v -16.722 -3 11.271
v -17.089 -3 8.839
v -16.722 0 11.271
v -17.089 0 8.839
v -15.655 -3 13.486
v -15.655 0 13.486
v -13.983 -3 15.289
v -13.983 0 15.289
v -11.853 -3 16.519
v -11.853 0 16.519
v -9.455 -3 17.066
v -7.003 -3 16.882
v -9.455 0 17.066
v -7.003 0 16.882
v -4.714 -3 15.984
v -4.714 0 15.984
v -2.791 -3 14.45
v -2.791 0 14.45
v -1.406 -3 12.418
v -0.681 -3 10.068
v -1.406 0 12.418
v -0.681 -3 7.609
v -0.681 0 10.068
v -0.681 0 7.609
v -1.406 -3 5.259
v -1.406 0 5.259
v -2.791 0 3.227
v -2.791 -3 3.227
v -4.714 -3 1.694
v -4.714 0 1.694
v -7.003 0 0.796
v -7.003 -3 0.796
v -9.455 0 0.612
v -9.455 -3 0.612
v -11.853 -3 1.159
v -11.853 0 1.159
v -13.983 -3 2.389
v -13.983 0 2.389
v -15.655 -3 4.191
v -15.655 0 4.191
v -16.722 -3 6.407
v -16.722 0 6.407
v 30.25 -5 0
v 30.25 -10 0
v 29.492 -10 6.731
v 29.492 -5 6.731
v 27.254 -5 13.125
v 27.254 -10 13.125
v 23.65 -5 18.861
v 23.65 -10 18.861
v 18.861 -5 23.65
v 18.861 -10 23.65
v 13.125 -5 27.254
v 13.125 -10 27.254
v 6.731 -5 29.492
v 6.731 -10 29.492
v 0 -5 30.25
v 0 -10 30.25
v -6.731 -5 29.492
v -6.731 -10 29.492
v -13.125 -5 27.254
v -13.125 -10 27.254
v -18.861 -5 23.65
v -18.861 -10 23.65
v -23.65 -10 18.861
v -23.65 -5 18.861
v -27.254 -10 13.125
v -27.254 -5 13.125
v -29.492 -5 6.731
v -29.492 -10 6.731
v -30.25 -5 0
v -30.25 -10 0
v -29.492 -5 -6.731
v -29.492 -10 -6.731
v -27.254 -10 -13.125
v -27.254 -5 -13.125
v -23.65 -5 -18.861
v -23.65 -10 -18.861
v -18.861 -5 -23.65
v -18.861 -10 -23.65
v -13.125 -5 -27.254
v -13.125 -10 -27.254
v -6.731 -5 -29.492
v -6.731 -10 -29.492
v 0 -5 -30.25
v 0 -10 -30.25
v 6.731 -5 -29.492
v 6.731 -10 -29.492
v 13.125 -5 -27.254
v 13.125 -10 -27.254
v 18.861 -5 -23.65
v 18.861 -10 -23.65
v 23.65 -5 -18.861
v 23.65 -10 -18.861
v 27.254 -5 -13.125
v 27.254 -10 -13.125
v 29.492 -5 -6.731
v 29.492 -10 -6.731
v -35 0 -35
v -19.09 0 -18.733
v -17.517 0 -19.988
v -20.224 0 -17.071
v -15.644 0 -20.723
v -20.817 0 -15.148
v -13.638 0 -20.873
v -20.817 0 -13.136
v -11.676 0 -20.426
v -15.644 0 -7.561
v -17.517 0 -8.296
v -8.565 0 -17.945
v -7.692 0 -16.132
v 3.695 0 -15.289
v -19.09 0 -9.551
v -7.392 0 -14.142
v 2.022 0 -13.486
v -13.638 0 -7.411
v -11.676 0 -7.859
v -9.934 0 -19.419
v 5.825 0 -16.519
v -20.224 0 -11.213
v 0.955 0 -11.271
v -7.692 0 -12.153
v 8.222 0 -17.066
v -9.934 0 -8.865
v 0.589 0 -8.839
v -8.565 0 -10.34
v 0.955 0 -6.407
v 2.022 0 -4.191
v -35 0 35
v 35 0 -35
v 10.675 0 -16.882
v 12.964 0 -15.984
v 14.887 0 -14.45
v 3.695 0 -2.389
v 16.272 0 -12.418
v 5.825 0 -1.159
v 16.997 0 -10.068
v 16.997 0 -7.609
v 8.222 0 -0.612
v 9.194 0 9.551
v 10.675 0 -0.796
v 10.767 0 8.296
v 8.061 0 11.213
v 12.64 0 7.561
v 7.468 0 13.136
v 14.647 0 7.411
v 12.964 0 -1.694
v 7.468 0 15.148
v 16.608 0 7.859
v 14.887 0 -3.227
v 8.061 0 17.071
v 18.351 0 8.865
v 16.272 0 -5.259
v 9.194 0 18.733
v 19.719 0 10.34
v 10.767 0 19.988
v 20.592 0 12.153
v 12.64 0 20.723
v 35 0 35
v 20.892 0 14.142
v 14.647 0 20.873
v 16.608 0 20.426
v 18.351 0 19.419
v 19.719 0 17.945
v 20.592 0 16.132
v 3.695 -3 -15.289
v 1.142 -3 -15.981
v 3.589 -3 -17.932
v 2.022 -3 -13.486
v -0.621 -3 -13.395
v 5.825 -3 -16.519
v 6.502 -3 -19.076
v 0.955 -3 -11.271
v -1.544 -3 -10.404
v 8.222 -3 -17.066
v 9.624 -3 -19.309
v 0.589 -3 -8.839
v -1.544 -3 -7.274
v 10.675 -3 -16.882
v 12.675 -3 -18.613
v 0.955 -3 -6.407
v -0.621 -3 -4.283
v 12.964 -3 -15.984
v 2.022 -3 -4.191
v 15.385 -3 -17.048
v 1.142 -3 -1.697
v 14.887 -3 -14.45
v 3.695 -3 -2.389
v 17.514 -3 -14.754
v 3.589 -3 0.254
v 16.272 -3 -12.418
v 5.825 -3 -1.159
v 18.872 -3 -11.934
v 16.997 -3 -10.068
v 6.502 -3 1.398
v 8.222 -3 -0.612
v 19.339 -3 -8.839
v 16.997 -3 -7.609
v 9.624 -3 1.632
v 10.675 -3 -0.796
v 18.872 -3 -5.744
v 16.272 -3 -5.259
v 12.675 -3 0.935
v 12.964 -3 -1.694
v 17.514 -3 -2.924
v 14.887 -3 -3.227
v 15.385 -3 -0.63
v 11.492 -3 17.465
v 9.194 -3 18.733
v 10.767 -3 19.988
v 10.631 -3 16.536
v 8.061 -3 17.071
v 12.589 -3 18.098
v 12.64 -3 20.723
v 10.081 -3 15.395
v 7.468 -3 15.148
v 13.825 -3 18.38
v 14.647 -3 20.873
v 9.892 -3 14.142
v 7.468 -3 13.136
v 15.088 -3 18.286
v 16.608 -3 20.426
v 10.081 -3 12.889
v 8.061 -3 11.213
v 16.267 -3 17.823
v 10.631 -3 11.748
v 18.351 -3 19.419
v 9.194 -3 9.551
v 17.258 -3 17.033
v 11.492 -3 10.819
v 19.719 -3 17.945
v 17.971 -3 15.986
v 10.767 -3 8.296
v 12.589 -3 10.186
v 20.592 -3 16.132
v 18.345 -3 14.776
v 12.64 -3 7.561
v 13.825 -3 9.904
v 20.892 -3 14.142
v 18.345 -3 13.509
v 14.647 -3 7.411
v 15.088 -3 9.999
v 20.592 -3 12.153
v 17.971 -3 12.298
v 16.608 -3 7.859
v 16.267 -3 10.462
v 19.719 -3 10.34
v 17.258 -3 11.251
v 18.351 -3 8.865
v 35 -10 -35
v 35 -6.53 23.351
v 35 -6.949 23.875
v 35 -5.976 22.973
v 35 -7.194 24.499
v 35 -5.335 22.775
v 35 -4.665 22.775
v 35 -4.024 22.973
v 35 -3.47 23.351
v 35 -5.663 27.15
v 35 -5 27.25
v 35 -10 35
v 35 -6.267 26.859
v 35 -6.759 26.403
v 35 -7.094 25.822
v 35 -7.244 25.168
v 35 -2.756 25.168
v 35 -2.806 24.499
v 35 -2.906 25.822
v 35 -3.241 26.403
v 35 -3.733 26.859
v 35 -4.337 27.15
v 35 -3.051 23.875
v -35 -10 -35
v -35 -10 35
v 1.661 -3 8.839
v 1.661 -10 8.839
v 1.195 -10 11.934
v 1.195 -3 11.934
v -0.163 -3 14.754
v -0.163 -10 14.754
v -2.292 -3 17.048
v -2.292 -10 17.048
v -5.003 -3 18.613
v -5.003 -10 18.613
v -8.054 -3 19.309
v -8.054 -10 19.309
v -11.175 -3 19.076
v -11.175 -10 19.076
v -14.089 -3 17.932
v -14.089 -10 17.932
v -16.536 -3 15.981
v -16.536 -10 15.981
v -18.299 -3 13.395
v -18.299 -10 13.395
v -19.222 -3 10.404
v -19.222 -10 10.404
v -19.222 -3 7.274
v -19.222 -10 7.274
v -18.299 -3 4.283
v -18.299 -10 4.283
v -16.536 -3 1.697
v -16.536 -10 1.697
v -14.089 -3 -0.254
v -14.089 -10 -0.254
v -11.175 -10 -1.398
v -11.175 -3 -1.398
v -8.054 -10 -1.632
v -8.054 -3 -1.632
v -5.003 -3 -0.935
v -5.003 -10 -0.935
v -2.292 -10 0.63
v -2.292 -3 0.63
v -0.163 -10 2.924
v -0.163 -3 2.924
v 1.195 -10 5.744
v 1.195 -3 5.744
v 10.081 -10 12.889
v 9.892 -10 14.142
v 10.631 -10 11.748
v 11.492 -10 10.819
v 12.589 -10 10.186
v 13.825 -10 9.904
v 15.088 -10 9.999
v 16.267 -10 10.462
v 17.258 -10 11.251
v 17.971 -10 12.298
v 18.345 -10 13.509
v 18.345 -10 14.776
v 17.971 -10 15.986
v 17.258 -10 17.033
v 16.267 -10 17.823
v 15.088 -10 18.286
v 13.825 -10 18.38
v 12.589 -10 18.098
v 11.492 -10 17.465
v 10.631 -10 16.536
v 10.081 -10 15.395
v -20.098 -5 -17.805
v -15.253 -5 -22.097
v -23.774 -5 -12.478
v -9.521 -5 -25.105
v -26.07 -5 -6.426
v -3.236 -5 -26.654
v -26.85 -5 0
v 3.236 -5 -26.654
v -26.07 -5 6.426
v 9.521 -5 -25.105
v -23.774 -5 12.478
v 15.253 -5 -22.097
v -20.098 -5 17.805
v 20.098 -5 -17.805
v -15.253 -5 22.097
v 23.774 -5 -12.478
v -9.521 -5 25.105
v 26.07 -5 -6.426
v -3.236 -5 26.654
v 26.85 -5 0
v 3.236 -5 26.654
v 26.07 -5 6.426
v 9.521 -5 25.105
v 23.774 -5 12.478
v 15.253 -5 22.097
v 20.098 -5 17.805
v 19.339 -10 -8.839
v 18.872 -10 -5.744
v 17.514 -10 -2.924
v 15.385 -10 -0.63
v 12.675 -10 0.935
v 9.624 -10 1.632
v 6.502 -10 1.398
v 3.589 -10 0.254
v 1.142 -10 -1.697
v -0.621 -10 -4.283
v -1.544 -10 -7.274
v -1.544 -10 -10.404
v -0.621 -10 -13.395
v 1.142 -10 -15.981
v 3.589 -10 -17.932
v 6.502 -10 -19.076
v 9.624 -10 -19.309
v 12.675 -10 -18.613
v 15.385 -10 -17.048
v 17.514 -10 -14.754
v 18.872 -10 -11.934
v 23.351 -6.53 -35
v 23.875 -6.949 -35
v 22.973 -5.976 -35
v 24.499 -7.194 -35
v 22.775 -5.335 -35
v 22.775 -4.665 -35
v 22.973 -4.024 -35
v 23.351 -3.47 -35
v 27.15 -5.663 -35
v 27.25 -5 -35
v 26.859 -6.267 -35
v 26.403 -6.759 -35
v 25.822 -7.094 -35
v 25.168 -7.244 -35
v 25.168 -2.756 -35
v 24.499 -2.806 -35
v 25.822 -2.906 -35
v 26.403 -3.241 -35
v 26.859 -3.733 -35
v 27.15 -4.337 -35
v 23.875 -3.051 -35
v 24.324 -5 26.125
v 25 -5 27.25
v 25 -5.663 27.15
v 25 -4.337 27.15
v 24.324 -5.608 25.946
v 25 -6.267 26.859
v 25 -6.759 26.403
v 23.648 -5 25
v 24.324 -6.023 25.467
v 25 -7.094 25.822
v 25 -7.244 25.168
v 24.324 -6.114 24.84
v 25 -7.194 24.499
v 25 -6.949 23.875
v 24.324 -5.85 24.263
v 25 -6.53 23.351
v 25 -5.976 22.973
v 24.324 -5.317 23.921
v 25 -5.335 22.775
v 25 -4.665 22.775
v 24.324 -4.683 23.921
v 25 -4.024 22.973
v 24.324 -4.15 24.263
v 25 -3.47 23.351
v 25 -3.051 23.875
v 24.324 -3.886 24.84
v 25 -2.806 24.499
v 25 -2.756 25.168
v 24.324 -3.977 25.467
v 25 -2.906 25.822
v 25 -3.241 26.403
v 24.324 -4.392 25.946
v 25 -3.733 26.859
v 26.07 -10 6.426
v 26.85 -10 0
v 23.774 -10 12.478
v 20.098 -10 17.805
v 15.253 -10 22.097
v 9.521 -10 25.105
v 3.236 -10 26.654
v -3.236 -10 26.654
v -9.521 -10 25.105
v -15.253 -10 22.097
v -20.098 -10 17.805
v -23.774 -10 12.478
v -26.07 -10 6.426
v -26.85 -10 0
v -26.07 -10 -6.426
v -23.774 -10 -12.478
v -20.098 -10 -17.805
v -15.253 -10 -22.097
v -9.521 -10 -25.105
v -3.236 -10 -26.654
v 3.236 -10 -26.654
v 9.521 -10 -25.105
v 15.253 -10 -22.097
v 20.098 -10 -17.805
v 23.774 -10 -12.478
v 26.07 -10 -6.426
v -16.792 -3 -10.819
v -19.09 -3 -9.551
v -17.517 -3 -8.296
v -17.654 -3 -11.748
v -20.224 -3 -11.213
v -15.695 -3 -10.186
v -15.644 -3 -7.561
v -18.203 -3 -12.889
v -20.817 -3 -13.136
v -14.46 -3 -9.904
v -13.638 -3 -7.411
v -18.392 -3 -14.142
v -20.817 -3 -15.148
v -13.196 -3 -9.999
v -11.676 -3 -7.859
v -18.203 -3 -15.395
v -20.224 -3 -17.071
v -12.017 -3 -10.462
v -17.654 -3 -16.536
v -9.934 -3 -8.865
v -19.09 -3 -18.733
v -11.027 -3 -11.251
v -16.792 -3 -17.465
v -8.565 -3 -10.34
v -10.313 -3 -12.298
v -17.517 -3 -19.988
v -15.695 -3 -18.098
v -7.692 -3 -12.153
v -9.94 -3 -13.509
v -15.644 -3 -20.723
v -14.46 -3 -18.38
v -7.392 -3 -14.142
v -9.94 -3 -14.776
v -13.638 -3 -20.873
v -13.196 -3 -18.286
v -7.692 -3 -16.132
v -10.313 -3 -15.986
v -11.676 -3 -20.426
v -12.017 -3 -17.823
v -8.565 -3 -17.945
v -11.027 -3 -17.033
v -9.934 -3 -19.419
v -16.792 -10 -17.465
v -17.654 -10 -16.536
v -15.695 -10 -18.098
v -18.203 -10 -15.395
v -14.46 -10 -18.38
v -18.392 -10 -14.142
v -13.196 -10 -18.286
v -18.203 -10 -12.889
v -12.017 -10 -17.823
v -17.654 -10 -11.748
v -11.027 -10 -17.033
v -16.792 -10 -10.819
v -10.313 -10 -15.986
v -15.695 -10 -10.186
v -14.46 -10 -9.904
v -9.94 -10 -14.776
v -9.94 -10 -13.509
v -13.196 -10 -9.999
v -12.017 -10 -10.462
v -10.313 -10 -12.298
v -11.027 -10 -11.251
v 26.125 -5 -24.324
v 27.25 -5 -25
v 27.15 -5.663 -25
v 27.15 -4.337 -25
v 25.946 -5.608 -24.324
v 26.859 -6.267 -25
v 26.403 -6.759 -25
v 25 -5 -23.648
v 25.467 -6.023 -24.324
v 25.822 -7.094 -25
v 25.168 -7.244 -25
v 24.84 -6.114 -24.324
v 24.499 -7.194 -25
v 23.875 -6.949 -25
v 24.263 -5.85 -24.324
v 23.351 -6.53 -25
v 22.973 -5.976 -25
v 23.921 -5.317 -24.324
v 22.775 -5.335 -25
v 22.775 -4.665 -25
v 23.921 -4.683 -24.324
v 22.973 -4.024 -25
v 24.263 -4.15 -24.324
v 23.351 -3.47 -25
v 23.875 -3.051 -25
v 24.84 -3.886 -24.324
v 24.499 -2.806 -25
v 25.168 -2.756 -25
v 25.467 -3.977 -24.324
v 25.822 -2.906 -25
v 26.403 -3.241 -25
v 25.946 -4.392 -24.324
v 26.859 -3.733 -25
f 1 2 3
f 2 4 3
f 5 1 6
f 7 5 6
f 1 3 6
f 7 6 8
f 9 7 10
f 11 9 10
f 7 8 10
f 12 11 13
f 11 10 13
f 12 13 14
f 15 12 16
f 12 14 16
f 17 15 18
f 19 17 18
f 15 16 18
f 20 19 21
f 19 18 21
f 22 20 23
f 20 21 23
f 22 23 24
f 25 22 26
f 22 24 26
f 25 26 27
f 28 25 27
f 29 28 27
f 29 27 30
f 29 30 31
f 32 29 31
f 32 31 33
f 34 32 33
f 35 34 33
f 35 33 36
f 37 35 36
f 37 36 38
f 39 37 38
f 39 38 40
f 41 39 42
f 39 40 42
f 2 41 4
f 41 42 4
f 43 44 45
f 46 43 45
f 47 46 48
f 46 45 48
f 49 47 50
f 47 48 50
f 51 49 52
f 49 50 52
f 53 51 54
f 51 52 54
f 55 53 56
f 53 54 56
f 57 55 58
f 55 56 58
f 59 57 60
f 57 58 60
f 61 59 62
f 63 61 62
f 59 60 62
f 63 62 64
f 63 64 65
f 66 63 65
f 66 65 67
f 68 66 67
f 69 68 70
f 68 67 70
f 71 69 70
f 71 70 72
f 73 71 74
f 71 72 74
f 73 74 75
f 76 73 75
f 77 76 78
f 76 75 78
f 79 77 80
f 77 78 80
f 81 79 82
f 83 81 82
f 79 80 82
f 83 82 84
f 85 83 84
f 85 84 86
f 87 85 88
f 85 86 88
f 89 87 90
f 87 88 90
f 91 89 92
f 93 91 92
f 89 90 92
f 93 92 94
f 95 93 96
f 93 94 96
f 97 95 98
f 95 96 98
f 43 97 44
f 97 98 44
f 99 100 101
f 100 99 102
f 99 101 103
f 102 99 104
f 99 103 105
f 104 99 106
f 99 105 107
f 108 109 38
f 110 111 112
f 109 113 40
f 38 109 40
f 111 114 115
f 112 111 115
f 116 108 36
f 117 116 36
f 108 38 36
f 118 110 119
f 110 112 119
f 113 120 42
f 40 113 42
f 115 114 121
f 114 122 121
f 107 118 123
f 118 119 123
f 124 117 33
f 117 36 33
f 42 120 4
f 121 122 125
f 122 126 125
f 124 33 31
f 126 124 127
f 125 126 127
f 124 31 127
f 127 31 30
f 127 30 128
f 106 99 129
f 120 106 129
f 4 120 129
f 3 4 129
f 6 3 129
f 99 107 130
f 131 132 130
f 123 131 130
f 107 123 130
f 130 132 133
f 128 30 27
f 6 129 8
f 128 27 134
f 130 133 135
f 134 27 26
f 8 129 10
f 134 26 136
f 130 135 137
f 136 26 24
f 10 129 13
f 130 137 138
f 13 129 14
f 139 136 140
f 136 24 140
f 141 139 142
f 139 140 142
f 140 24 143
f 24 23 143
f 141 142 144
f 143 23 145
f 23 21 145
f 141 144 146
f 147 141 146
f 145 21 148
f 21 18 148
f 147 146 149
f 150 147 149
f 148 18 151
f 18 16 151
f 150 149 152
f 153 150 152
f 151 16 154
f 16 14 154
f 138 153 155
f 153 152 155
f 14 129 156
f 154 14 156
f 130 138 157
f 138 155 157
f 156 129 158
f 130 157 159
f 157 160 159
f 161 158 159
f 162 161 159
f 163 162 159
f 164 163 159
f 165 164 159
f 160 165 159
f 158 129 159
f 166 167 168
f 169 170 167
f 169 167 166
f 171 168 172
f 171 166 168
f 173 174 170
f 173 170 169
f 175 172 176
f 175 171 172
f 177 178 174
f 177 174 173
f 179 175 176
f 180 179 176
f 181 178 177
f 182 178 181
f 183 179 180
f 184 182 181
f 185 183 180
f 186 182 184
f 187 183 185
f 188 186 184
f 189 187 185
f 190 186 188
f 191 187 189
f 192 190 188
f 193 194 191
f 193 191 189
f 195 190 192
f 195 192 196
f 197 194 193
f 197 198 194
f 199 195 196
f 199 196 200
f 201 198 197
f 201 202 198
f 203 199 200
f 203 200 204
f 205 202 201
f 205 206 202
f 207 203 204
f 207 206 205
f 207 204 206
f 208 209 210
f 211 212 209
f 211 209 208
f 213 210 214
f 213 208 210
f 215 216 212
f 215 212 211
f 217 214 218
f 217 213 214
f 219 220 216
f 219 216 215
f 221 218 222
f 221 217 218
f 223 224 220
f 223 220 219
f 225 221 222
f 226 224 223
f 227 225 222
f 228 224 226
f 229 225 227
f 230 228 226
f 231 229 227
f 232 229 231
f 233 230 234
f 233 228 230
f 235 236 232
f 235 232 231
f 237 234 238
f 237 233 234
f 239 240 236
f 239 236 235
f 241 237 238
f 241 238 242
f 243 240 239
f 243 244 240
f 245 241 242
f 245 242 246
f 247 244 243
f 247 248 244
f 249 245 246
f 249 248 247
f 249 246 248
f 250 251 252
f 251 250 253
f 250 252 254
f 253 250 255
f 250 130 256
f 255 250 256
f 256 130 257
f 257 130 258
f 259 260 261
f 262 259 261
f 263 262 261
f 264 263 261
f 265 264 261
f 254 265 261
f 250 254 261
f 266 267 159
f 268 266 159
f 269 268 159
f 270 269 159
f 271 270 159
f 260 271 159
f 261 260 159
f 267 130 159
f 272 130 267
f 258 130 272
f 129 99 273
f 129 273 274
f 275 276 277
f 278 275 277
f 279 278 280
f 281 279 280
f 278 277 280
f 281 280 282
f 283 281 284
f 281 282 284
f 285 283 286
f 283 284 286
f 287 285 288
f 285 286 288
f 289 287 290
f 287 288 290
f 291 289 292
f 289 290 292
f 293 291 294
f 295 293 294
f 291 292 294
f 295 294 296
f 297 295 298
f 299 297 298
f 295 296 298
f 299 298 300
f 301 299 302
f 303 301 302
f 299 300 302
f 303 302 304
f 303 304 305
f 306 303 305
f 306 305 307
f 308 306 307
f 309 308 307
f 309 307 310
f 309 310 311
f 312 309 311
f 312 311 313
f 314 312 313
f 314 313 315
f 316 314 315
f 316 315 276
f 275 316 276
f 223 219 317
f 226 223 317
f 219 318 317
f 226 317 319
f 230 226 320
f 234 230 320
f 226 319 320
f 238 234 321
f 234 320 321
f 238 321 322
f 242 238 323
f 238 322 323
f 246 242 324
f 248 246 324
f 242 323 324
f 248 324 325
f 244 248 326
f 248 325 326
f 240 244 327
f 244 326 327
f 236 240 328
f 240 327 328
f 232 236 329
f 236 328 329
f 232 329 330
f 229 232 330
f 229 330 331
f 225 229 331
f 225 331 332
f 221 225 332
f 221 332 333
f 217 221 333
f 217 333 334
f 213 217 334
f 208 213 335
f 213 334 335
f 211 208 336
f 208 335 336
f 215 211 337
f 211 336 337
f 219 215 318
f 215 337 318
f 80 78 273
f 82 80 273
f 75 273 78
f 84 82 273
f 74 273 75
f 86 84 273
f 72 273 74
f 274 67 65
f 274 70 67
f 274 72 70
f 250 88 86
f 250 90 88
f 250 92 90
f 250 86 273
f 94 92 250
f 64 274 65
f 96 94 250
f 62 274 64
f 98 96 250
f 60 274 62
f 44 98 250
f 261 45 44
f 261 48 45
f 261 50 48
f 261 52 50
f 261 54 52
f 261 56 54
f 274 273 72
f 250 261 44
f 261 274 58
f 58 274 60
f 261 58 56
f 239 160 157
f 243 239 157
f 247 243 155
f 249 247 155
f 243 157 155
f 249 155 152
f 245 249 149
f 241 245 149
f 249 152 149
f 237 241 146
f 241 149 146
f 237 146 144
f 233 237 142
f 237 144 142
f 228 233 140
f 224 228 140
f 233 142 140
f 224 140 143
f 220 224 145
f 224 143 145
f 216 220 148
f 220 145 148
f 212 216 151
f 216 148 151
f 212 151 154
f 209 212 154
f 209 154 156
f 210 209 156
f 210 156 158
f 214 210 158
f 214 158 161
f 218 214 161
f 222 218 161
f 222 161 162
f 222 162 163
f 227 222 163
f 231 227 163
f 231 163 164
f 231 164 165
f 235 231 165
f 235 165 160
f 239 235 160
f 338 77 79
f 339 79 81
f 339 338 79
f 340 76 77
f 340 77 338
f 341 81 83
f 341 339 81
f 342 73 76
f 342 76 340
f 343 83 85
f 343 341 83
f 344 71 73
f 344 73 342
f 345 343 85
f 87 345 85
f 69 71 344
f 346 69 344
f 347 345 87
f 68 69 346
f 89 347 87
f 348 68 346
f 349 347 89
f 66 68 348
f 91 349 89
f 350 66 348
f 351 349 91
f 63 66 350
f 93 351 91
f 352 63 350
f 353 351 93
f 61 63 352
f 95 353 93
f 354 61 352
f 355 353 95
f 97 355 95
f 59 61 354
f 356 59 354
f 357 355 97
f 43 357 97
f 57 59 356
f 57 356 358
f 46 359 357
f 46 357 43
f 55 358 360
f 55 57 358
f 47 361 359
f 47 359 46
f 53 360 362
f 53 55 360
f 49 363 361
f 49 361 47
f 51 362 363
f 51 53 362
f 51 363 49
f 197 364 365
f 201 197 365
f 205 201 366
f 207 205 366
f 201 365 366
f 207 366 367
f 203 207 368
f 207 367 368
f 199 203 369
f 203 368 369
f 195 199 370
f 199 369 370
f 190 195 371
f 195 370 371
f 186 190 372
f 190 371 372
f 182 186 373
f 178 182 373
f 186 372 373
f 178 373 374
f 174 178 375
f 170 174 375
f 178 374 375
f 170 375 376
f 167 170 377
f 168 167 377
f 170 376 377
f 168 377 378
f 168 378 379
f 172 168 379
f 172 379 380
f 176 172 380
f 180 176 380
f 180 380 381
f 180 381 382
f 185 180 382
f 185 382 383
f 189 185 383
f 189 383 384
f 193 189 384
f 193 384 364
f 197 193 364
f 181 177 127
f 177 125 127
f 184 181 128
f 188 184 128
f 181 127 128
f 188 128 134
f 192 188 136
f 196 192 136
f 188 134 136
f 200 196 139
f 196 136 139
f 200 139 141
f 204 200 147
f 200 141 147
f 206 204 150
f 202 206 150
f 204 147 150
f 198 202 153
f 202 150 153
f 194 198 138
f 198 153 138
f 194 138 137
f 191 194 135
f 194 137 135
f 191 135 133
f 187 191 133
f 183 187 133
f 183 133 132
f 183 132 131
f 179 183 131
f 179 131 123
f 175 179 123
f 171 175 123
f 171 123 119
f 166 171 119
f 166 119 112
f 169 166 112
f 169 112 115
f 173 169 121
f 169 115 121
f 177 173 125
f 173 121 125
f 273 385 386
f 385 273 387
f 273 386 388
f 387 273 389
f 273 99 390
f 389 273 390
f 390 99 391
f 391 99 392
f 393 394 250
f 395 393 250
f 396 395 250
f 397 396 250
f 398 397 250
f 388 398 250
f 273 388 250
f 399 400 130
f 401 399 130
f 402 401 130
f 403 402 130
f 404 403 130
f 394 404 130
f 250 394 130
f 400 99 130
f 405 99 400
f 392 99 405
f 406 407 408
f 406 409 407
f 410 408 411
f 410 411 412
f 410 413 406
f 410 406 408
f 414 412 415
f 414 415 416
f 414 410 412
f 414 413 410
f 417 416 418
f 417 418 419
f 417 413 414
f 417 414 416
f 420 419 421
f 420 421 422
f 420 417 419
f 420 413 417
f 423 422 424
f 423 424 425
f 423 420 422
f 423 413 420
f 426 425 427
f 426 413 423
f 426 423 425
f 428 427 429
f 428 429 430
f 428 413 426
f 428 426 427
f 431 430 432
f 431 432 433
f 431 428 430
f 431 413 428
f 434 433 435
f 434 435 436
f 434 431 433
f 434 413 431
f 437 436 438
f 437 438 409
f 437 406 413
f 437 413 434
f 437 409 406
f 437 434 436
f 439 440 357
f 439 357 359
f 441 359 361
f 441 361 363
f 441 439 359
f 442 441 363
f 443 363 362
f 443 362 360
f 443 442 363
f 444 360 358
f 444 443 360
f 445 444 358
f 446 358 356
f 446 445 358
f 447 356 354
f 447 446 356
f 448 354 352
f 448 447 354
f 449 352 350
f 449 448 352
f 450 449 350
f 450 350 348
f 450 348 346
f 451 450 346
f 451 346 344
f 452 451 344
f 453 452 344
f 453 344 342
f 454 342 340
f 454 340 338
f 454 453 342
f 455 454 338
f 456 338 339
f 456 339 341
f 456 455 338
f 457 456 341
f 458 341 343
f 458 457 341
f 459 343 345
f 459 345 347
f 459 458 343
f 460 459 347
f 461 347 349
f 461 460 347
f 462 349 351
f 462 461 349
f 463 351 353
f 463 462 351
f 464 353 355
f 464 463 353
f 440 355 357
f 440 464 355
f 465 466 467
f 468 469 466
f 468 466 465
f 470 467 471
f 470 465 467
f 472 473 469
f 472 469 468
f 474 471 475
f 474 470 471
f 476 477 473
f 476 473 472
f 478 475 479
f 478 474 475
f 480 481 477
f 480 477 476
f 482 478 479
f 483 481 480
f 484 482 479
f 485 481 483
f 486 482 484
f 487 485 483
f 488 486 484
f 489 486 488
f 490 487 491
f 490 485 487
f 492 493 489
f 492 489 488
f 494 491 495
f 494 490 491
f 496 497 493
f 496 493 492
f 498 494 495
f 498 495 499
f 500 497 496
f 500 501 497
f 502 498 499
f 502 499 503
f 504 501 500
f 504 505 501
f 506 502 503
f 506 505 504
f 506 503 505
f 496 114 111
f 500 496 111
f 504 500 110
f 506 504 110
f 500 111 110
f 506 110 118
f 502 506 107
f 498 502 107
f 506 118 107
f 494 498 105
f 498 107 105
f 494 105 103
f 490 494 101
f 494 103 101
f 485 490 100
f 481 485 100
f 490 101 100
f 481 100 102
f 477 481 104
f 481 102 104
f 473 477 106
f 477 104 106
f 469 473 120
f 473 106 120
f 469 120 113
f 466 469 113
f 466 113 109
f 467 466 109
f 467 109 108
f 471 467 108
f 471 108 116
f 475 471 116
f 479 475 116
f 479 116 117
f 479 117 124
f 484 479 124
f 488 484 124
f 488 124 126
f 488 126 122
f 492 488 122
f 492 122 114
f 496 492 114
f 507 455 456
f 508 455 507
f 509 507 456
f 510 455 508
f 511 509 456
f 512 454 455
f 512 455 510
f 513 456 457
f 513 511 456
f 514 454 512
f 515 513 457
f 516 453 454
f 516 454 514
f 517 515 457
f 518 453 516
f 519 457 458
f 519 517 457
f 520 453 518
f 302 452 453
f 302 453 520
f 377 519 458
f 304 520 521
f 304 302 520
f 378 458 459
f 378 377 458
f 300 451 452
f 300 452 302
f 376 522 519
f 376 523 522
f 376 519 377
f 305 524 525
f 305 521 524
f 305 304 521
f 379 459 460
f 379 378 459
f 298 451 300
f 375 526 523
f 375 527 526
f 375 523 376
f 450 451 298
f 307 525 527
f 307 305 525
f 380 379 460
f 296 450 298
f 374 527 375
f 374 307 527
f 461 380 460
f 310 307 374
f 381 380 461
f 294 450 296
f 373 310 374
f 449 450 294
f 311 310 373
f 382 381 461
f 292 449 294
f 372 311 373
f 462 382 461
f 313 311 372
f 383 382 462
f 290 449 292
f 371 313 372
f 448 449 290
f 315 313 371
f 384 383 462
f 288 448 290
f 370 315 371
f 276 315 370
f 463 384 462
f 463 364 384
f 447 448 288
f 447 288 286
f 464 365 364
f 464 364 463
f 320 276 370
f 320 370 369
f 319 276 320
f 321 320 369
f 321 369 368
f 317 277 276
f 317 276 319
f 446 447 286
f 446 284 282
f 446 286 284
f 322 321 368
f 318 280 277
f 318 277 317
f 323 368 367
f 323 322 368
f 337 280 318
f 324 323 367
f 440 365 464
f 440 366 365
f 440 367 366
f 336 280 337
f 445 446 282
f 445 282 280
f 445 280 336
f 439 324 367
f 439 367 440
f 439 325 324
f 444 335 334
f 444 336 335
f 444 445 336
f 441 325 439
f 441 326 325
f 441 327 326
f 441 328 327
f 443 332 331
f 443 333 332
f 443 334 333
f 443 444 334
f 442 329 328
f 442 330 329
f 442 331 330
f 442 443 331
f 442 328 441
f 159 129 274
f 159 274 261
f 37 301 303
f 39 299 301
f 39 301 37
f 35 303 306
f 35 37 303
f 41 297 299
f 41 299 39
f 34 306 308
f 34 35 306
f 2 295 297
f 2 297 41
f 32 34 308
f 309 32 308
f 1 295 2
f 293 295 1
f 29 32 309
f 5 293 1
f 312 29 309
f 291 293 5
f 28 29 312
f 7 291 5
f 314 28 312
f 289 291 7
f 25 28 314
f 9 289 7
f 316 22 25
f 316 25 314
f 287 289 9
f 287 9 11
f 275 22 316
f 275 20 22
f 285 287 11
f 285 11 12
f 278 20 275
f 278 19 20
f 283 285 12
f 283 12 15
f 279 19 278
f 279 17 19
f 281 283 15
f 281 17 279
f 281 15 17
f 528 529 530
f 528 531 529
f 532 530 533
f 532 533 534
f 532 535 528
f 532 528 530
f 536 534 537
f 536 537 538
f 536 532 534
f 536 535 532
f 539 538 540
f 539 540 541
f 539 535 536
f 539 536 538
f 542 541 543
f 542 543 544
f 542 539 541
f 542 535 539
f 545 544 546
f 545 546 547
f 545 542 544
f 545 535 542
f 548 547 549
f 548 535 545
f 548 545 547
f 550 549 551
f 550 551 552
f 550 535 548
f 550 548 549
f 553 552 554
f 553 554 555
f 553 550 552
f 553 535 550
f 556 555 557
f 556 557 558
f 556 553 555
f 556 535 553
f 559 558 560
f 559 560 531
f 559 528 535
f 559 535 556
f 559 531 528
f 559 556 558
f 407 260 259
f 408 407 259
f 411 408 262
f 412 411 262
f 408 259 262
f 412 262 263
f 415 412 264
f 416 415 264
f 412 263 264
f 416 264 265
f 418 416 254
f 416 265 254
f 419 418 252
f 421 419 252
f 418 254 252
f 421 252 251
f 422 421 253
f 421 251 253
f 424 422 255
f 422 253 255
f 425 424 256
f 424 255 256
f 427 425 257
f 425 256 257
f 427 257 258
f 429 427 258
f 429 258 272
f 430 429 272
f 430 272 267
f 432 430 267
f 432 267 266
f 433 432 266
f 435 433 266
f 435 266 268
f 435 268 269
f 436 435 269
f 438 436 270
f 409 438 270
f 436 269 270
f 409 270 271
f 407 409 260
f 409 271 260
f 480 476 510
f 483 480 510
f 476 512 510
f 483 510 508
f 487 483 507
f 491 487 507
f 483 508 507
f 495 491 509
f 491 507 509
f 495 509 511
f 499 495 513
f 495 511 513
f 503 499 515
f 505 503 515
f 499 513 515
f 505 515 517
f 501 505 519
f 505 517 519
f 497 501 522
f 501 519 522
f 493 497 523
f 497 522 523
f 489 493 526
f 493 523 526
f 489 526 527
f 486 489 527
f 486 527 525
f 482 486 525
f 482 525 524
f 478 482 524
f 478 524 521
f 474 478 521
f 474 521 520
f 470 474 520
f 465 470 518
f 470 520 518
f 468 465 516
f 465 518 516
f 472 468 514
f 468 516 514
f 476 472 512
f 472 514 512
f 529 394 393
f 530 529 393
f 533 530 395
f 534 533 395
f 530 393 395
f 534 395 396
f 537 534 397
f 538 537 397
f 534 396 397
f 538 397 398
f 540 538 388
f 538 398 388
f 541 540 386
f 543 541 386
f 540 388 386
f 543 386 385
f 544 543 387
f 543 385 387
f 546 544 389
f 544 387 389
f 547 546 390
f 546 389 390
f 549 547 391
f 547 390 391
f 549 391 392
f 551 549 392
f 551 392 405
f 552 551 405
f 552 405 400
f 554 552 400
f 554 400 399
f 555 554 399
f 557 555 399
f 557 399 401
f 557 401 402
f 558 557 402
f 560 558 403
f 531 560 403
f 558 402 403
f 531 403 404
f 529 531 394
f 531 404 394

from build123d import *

# Parameters (mm, degrees)
SKETCH_W            = 70
SKETCH_H            = 70
PAD_DEPTH           = 10
SKETCH001_R         = 30.25
SKETCH001_R_2       = 26.85
POCKET_DEPTH        = 5
SKETCH003_R         = 2.25
HOLE_DEPTH          = 10
HOLE_TIPS_R         = 2.25
SKETCH004_R         = 2.25
HOLE001_DEPTH       = 10
HOLE001_TIPS_R      = 2.25
HOLE003_D           = 16.5
HOLE003_CBORE_D     = 21
HOLE003_CBORE_DEPTH = 7
HOLE004_D           = 8.5
HOLE004_CBORE_D     = 13.5
HOLE004_CBORE_DEPTH = 3


with BuildPart() as part:
    # Sketch → Pad (new body)
    with BuildSketch(Plane.XZ):
        Rectangle(SKETCH_W, SKETCH_H)
    extrude(amount=PAD_DEPTH)

    # Sketch001 (on Face6 of Pad) → Pocket (cut)
    with BuildSketch(Plane.XZ.offset(10)):
        Circle(SKETCH001_R)
        Circle(SKETCH001_R_2, mode=Mode.SUBTRACT)
    extrude(amount=-POCKET_DEPTH, mode=Mode.SUBTRACT)

    # Sketch003 (on Face3 of Pocket) → Hole (cut)
    with BuildSketch(Plane(origin=(35, 0, 0), x_dir=(0, 0, 1), z_dir=(1, 0, 0))):
        with Locations((25, 5)):
            Circle(SKETCH003_R)
    extrude(amount=-HOLE_DEPTH, mode=Mode.SUBTRACT)

    # Hole tips → Hole tip 1 section 0
    with BuildSketch(Plane(origin=(25, 0, 0), x_dir=(0, 0, 1), z_dir=(1, 0, 0)), mode=Mode.PRIVATE) as hole_tip_1_s0:
        with Locations((25, 5)):
            Circle(HOLE_TIPS_R)
    loft([hole_tip_1_s0.sketch, Vertex(23.648064, -5, 25)], mode=Mode.SUBTRACT)

    # Sketch004 (on Face6 of Hole) → Hole001 (cut)
    with BuildSketch(Plane(origin=(0, 0, -35), x_dir=(1, 0, 0), z_dir=(0, 0, -1))):
        with Locations((25, 5)):
            Circle(SKETCH004_R)
    extrude(amount=-HOLE001_DEPTH, mode=Mode.SUBTRACT)

    # Hole001 tips → Hole001 tip 1 section 0
    with BuildSketch(Plane(origin=(0, 0, -25), x_dir=(1, 0, 0), z_dir=(0, 0, -1)), mode=Mode.PRIVATE) as hole001_tip_1_s0:
        with Locations((25, 5)):
            Circle(HOLE001_TIPS_R)
    loft([hole001_tip_1_s0.sketch, Vertex(25, -5, -23.648064)], mode=Mode.SUBTRACT)

    # Hole003 (through all)
    with Locations(Plane.XZ.offset(10)):
        with Locations((-8.838835, 8.838835), (8.838835, -8.838835)):
            CounterBoreHole(HOLE003_D / 2, HOLE003_CBORE_D / 2, HOLE003_CBORE_DEPTH)

    # Hole004 (through all)
    with Locations(Plane(origin=(0, 0, 0), x_dir=(1, 0, 0), z_dir=(0, 1, 0))):
        with Locations((-14.142136, 14.142136), (14.142136, -14.142136)):
            CounterBoreHole(HOLE004_D / 2, HOLE004_CBORE_D / 2, HOLE004_CBORE_DEPTH)


solid = part.part
